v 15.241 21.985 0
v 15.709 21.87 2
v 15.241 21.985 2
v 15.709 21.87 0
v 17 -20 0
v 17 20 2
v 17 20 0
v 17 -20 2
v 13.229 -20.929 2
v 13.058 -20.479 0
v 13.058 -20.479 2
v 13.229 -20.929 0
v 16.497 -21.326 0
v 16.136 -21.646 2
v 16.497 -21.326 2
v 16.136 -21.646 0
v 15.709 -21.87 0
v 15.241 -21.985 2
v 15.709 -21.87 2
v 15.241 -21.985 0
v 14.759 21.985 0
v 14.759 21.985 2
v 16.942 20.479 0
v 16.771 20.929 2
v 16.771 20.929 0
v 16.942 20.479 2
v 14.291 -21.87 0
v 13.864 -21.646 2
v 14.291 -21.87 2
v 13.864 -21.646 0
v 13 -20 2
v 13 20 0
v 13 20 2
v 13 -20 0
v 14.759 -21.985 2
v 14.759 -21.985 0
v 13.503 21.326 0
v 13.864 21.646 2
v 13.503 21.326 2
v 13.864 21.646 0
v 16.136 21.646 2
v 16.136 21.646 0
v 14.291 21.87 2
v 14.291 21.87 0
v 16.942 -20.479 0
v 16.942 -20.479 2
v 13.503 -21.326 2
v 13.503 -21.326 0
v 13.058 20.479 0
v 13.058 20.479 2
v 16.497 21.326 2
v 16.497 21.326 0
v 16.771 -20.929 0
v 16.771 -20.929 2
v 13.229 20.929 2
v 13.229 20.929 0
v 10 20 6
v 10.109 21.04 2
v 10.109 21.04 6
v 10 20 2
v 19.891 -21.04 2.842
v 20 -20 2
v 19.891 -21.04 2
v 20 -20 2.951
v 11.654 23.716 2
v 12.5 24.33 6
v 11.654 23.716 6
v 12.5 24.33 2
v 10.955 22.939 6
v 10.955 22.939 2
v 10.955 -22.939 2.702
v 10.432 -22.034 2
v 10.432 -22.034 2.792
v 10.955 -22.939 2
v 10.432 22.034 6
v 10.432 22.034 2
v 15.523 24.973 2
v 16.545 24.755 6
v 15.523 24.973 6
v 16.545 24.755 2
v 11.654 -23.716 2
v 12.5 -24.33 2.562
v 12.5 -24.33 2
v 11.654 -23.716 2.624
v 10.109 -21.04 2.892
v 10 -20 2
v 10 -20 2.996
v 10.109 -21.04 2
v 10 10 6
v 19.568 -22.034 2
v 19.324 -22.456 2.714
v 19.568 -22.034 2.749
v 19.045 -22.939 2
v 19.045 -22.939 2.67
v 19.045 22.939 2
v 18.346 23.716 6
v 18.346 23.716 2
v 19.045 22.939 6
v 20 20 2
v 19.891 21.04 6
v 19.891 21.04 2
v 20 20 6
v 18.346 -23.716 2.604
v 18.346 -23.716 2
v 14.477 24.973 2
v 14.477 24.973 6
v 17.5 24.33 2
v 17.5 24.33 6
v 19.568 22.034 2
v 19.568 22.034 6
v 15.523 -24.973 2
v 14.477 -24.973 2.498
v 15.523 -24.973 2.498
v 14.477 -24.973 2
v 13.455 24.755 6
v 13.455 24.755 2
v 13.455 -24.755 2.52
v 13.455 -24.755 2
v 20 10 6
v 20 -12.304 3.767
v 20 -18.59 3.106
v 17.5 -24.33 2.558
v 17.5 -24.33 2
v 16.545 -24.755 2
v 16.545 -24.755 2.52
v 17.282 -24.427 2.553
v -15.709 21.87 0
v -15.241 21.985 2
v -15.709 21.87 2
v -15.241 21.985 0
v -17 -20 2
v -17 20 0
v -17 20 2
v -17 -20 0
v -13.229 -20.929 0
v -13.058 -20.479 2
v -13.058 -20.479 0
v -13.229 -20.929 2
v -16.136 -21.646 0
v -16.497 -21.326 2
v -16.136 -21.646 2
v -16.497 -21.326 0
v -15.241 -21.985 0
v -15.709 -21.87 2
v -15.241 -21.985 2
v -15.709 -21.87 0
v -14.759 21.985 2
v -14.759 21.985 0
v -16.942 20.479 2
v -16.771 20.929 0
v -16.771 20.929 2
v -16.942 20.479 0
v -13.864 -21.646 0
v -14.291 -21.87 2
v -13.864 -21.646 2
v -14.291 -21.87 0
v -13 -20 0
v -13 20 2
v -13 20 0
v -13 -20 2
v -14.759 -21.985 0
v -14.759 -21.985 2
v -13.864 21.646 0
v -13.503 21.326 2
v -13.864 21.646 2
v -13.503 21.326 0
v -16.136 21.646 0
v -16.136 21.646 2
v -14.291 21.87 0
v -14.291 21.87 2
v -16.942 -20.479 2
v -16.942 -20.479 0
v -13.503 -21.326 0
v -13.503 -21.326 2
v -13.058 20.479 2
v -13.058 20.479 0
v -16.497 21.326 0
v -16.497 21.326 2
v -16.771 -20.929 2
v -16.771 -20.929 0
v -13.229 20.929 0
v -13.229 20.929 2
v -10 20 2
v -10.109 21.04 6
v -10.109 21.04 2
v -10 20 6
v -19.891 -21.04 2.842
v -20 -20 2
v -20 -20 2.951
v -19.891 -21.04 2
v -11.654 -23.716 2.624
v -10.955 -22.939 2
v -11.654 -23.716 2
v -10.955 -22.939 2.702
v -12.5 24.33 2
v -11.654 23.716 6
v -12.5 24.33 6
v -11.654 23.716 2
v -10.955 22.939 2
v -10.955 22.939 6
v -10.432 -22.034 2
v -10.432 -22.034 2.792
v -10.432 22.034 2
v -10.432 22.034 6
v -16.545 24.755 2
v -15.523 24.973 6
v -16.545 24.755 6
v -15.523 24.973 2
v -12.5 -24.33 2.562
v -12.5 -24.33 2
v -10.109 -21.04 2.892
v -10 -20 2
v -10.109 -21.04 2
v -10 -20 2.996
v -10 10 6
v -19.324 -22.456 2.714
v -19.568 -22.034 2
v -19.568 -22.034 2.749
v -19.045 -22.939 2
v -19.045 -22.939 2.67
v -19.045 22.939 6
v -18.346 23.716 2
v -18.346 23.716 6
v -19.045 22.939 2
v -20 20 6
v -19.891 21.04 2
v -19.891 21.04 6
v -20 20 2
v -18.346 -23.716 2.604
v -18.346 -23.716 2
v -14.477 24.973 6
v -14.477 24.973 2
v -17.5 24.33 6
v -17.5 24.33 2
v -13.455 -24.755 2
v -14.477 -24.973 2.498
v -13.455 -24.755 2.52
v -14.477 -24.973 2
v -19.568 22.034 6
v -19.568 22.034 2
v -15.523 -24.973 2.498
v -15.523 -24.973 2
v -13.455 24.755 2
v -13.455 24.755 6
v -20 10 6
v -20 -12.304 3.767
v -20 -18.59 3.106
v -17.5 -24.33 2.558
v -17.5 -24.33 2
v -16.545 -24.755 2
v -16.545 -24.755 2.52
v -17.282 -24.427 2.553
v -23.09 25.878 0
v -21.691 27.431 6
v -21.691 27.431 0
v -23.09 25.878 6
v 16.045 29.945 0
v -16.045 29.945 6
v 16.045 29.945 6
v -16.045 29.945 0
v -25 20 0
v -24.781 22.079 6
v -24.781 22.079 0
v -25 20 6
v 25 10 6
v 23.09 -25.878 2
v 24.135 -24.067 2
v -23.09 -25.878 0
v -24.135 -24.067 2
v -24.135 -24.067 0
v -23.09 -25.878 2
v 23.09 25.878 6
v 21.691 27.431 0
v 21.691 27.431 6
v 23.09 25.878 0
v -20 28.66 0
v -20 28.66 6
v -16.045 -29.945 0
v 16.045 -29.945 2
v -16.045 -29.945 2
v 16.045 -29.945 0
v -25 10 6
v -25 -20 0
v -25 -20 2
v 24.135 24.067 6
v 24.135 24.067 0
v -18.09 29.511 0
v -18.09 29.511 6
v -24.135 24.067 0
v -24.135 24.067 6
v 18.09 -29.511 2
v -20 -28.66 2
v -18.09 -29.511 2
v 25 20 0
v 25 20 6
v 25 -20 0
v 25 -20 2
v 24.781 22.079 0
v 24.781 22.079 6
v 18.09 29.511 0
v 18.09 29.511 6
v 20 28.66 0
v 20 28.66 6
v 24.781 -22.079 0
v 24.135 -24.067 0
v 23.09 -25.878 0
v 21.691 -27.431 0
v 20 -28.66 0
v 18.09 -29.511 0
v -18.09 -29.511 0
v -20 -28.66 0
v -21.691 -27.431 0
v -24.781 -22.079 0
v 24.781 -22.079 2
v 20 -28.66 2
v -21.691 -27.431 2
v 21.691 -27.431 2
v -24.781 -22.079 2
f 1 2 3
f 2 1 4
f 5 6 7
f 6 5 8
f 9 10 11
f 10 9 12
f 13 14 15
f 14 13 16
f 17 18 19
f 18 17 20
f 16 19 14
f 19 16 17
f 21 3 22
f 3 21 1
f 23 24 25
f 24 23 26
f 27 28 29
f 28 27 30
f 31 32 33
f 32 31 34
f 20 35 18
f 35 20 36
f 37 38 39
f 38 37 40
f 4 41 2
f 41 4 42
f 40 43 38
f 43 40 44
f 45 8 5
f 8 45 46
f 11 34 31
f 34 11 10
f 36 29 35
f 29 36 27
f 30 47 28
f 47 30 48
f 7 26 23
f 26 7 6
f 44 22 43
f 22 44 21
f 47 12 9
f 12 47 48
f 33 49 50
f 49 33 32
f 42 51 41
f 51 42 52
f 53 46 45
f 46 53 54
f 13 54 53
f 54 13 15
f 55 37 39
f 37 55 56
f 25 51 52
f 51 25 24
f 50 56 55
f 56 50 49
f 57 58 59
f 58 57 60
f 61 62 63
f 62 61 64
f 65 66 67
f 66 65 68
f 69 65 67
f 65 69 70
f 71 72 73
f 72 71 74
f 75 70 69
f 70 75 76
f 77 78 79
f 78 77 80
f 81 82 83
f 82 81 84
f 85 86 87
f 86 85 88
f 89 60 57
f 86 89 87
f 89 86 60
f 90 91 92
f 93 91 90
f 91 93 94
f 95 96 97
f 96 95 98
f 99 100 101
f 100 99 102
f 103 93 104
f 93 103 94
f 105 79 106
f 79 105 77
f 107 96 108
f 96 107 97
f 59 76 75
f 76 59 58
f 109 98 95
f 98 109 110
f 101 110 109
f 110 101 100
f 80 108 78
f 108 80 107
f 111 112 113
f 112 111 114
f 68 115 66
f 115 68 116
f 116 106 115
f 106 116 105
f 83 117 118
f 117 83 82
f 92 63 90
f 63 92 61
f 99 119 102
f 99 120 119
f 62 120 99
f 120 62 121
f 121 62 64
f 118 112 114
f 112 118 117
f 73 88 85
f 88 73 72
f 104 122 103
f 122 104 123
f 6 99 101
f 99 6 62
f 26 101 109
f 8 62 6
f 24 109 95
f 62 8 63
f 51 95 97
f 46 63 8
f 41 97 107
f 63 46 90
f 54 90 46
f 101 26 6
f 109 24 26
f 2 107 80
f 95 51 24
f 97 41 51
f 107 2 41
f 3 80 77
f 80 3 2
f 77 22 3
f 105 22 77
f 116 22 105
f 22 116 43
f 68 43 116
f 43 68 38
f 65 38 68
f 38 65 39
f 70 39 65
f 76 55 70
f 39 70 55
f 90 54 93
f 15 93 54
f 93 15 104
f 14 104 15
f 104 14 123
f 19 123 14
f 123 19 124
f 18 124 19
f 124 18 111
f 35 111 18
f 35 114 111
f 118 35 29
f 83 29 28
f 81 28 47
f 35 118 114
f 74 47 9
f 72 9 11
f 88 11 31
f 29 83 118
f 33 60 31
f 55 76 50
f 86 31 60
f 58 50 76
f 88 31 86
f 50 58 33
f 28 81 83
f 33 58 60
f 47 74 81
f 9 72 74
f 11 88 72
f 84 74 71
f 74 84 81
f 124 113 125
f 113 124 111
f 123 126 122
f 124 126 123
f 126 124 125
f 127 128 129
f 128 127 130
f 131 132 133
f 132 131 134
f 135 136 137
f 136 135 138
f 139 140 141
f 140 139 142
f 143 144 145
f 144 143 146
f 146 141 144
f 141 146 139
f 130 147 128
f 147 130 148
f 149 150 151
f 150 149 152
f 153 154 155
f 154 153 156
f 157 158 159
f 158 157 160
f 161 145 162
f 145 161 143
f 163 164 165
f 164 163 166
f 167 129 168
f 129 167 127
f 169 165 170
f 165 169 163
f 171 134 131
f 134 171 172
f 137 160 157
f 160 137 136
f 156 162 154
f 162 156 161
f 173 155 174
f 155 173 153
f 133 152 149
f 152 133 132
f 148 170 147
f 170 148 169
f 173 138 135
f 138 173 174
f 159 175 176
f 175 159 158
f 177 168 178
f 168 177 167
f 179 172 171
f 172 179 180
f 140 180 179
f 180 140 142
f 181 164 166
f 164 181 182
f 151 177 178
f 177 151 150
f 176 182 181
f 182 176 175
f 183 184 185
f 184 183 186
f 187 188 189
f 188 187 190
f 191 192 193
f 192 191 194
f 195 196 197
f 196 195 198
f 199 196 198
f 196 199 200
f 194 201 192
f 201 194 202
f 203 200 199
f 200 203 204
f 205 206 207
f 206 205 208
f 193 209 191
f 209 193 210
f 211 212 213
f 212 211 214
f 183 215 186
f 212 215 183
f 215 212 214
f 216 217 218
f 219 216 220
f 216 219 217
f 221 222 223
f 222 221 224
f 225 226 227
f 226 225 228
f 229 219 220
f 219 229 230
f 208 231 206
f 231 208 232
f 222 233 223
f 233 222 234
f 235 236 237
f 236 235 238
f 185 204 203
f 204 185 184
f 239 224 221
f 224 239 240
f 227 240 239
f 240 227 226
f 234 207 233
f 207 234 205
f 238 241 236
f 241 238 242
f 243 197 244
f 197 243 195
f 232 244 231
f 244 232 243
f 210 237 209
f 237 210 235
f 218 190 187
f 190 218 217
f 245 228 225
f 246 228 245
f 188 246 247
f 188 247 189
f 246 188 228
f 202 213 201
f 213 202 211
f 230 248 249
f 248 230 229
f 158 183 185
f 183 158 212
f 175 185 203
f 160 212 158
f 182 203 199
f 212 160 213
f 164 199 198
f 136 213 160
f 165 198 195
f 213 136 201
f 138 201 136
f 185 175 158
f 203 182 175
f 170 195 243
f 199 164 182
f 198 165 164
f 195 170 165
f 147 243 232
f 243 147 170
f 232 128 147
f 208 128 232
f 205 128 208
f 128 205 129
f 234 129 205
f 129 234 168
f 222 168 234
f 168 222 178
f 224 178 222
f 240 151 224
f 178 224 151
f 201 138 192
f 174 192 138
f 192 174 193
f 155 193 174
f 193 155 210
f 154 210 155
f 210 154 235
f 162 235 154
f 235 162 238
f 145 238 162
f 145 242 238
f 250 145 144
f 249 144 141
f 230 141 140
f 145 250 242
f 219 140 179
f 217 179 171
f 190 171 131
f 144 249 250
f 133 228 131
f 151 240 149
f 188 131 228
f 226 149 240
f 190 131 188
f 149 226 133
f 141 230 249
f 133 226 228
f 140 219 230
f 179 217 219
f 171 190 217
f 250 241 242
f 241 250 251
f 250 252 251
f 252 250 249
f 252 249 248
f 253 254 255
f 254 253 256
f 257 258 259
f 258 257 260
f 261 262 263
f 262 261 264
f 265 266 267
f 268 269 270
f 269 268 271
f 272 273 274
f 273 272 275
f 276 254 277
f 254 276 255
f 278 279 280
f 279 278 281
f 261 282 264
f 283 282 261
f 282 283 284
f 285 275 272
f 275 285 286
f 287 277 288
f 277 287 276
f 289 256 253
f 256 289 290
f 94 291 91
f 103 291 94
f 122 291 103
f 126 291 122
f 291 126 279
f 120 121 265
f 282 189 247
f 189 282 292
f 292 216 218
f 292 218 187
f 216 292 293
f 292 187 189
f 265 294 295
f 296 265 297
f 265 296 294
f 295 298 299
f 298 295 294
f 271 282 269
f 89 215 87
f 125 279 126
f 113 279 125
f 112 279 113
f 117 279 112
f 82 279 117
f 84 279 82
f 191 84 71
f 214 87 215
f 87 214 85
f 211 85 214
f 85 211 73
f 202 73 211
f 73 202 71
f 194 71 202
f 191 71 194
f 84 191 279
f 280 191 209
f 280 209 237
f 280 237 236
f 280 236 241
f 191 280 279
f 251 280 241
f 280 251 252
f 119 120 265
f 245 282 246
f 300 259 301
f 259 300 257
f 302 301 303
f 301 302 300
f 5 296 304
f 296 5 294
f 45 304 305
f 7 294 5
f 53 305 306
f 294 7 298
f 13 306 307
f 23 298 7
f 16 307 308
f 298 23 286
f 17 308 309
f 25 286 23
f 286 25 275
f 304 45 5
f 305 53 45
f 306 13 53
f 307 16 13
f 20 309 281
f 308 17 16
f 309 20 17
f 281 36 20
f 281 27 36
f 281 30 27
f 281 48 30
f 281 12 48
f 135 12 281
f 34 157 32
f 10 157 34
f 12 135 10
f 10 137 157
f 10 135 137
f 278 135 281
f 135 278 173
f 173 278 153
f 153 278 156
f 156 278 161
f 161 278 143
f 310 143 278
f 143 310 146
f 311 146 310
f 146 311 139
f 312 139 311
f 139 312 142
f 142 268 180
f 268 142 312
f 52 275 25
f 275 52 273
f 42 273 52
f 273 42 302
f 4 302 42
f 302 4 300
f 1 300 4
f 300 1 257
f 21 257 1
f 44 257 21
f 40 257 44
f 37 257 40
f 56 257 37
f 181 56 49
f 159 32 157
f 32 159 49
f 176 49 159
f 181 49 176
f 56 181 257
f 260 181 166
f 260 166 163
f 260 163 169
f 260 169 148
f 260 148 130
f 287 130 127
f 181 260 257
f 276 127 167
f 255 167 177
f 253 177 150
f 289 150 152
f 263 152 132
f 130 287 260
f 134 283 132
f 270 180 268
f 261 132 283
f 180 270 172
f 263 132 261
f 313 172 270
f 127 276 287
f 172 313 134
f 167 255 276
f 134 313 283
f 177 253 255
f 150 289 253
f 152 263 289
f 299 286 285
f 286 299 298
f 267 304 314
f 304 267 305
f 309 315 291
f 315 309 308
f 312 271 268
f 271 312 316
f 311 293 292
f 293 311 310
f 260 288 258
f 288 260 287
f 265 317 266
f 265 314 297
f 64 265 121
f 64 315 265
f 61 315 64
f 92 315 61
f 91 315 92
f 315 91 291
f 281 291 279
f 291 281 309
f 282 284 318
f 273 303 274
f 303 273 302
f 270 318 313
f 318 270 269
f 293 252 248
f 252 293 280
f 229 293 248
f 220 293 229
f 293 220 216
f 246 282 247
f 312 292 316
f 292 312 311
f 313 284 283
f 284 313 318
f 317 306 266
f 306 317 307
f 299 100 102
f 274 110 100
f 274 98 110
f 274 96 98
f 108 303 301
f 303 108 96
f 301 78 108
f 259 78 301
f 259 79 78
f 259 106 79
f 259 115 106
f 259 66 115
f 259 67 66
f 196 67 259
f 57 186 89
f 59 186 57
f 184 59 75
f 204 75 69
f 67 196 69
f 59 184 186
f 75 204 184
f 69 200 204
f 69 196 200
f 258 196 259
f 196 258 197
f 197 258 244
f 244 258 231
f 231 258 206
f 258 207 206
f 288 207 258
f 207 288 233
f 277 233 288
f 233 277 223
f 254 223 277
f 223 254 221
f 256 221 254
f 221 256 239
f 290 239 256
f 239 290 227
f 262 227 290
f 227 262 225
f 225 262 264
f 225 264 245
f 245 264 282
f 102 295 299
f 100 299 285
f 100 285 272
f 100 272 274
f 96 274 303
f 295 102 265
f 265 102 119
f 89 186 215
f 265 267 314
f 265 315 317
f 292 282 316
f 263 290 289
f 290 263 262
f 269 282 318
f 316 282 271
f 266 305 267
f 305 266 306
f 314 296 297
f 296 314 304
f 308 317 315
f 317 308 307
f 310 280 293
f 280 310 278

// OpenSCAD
s = [30,40];
b = 10;

$fs = 0.5;

difference()
{
    hull() for(i=[0,1],j=[0,1]) mirror([i,0])
    {
        translate(s/2) 
        {
            cylinder(r=b,h=6);
            translate([0,-b,0]) cube([b,b,6]);
        }
        mirror([0,1]) translate(s/2) cylinder(r=b,h=2);
        
    }
    for(i=[0,1]) mirror([i,0]) 
    {
        hull() for(j=[0,1])  mirror([0,j]) translate(s/2) translate([0,0,-2]) cylinder(r=2,h=10);
        hull() for(j=[0,1])  mirror([0,j]) translate(s/2) translate([0,0,2]) cylinder(r=5,h=10);
    }
}
